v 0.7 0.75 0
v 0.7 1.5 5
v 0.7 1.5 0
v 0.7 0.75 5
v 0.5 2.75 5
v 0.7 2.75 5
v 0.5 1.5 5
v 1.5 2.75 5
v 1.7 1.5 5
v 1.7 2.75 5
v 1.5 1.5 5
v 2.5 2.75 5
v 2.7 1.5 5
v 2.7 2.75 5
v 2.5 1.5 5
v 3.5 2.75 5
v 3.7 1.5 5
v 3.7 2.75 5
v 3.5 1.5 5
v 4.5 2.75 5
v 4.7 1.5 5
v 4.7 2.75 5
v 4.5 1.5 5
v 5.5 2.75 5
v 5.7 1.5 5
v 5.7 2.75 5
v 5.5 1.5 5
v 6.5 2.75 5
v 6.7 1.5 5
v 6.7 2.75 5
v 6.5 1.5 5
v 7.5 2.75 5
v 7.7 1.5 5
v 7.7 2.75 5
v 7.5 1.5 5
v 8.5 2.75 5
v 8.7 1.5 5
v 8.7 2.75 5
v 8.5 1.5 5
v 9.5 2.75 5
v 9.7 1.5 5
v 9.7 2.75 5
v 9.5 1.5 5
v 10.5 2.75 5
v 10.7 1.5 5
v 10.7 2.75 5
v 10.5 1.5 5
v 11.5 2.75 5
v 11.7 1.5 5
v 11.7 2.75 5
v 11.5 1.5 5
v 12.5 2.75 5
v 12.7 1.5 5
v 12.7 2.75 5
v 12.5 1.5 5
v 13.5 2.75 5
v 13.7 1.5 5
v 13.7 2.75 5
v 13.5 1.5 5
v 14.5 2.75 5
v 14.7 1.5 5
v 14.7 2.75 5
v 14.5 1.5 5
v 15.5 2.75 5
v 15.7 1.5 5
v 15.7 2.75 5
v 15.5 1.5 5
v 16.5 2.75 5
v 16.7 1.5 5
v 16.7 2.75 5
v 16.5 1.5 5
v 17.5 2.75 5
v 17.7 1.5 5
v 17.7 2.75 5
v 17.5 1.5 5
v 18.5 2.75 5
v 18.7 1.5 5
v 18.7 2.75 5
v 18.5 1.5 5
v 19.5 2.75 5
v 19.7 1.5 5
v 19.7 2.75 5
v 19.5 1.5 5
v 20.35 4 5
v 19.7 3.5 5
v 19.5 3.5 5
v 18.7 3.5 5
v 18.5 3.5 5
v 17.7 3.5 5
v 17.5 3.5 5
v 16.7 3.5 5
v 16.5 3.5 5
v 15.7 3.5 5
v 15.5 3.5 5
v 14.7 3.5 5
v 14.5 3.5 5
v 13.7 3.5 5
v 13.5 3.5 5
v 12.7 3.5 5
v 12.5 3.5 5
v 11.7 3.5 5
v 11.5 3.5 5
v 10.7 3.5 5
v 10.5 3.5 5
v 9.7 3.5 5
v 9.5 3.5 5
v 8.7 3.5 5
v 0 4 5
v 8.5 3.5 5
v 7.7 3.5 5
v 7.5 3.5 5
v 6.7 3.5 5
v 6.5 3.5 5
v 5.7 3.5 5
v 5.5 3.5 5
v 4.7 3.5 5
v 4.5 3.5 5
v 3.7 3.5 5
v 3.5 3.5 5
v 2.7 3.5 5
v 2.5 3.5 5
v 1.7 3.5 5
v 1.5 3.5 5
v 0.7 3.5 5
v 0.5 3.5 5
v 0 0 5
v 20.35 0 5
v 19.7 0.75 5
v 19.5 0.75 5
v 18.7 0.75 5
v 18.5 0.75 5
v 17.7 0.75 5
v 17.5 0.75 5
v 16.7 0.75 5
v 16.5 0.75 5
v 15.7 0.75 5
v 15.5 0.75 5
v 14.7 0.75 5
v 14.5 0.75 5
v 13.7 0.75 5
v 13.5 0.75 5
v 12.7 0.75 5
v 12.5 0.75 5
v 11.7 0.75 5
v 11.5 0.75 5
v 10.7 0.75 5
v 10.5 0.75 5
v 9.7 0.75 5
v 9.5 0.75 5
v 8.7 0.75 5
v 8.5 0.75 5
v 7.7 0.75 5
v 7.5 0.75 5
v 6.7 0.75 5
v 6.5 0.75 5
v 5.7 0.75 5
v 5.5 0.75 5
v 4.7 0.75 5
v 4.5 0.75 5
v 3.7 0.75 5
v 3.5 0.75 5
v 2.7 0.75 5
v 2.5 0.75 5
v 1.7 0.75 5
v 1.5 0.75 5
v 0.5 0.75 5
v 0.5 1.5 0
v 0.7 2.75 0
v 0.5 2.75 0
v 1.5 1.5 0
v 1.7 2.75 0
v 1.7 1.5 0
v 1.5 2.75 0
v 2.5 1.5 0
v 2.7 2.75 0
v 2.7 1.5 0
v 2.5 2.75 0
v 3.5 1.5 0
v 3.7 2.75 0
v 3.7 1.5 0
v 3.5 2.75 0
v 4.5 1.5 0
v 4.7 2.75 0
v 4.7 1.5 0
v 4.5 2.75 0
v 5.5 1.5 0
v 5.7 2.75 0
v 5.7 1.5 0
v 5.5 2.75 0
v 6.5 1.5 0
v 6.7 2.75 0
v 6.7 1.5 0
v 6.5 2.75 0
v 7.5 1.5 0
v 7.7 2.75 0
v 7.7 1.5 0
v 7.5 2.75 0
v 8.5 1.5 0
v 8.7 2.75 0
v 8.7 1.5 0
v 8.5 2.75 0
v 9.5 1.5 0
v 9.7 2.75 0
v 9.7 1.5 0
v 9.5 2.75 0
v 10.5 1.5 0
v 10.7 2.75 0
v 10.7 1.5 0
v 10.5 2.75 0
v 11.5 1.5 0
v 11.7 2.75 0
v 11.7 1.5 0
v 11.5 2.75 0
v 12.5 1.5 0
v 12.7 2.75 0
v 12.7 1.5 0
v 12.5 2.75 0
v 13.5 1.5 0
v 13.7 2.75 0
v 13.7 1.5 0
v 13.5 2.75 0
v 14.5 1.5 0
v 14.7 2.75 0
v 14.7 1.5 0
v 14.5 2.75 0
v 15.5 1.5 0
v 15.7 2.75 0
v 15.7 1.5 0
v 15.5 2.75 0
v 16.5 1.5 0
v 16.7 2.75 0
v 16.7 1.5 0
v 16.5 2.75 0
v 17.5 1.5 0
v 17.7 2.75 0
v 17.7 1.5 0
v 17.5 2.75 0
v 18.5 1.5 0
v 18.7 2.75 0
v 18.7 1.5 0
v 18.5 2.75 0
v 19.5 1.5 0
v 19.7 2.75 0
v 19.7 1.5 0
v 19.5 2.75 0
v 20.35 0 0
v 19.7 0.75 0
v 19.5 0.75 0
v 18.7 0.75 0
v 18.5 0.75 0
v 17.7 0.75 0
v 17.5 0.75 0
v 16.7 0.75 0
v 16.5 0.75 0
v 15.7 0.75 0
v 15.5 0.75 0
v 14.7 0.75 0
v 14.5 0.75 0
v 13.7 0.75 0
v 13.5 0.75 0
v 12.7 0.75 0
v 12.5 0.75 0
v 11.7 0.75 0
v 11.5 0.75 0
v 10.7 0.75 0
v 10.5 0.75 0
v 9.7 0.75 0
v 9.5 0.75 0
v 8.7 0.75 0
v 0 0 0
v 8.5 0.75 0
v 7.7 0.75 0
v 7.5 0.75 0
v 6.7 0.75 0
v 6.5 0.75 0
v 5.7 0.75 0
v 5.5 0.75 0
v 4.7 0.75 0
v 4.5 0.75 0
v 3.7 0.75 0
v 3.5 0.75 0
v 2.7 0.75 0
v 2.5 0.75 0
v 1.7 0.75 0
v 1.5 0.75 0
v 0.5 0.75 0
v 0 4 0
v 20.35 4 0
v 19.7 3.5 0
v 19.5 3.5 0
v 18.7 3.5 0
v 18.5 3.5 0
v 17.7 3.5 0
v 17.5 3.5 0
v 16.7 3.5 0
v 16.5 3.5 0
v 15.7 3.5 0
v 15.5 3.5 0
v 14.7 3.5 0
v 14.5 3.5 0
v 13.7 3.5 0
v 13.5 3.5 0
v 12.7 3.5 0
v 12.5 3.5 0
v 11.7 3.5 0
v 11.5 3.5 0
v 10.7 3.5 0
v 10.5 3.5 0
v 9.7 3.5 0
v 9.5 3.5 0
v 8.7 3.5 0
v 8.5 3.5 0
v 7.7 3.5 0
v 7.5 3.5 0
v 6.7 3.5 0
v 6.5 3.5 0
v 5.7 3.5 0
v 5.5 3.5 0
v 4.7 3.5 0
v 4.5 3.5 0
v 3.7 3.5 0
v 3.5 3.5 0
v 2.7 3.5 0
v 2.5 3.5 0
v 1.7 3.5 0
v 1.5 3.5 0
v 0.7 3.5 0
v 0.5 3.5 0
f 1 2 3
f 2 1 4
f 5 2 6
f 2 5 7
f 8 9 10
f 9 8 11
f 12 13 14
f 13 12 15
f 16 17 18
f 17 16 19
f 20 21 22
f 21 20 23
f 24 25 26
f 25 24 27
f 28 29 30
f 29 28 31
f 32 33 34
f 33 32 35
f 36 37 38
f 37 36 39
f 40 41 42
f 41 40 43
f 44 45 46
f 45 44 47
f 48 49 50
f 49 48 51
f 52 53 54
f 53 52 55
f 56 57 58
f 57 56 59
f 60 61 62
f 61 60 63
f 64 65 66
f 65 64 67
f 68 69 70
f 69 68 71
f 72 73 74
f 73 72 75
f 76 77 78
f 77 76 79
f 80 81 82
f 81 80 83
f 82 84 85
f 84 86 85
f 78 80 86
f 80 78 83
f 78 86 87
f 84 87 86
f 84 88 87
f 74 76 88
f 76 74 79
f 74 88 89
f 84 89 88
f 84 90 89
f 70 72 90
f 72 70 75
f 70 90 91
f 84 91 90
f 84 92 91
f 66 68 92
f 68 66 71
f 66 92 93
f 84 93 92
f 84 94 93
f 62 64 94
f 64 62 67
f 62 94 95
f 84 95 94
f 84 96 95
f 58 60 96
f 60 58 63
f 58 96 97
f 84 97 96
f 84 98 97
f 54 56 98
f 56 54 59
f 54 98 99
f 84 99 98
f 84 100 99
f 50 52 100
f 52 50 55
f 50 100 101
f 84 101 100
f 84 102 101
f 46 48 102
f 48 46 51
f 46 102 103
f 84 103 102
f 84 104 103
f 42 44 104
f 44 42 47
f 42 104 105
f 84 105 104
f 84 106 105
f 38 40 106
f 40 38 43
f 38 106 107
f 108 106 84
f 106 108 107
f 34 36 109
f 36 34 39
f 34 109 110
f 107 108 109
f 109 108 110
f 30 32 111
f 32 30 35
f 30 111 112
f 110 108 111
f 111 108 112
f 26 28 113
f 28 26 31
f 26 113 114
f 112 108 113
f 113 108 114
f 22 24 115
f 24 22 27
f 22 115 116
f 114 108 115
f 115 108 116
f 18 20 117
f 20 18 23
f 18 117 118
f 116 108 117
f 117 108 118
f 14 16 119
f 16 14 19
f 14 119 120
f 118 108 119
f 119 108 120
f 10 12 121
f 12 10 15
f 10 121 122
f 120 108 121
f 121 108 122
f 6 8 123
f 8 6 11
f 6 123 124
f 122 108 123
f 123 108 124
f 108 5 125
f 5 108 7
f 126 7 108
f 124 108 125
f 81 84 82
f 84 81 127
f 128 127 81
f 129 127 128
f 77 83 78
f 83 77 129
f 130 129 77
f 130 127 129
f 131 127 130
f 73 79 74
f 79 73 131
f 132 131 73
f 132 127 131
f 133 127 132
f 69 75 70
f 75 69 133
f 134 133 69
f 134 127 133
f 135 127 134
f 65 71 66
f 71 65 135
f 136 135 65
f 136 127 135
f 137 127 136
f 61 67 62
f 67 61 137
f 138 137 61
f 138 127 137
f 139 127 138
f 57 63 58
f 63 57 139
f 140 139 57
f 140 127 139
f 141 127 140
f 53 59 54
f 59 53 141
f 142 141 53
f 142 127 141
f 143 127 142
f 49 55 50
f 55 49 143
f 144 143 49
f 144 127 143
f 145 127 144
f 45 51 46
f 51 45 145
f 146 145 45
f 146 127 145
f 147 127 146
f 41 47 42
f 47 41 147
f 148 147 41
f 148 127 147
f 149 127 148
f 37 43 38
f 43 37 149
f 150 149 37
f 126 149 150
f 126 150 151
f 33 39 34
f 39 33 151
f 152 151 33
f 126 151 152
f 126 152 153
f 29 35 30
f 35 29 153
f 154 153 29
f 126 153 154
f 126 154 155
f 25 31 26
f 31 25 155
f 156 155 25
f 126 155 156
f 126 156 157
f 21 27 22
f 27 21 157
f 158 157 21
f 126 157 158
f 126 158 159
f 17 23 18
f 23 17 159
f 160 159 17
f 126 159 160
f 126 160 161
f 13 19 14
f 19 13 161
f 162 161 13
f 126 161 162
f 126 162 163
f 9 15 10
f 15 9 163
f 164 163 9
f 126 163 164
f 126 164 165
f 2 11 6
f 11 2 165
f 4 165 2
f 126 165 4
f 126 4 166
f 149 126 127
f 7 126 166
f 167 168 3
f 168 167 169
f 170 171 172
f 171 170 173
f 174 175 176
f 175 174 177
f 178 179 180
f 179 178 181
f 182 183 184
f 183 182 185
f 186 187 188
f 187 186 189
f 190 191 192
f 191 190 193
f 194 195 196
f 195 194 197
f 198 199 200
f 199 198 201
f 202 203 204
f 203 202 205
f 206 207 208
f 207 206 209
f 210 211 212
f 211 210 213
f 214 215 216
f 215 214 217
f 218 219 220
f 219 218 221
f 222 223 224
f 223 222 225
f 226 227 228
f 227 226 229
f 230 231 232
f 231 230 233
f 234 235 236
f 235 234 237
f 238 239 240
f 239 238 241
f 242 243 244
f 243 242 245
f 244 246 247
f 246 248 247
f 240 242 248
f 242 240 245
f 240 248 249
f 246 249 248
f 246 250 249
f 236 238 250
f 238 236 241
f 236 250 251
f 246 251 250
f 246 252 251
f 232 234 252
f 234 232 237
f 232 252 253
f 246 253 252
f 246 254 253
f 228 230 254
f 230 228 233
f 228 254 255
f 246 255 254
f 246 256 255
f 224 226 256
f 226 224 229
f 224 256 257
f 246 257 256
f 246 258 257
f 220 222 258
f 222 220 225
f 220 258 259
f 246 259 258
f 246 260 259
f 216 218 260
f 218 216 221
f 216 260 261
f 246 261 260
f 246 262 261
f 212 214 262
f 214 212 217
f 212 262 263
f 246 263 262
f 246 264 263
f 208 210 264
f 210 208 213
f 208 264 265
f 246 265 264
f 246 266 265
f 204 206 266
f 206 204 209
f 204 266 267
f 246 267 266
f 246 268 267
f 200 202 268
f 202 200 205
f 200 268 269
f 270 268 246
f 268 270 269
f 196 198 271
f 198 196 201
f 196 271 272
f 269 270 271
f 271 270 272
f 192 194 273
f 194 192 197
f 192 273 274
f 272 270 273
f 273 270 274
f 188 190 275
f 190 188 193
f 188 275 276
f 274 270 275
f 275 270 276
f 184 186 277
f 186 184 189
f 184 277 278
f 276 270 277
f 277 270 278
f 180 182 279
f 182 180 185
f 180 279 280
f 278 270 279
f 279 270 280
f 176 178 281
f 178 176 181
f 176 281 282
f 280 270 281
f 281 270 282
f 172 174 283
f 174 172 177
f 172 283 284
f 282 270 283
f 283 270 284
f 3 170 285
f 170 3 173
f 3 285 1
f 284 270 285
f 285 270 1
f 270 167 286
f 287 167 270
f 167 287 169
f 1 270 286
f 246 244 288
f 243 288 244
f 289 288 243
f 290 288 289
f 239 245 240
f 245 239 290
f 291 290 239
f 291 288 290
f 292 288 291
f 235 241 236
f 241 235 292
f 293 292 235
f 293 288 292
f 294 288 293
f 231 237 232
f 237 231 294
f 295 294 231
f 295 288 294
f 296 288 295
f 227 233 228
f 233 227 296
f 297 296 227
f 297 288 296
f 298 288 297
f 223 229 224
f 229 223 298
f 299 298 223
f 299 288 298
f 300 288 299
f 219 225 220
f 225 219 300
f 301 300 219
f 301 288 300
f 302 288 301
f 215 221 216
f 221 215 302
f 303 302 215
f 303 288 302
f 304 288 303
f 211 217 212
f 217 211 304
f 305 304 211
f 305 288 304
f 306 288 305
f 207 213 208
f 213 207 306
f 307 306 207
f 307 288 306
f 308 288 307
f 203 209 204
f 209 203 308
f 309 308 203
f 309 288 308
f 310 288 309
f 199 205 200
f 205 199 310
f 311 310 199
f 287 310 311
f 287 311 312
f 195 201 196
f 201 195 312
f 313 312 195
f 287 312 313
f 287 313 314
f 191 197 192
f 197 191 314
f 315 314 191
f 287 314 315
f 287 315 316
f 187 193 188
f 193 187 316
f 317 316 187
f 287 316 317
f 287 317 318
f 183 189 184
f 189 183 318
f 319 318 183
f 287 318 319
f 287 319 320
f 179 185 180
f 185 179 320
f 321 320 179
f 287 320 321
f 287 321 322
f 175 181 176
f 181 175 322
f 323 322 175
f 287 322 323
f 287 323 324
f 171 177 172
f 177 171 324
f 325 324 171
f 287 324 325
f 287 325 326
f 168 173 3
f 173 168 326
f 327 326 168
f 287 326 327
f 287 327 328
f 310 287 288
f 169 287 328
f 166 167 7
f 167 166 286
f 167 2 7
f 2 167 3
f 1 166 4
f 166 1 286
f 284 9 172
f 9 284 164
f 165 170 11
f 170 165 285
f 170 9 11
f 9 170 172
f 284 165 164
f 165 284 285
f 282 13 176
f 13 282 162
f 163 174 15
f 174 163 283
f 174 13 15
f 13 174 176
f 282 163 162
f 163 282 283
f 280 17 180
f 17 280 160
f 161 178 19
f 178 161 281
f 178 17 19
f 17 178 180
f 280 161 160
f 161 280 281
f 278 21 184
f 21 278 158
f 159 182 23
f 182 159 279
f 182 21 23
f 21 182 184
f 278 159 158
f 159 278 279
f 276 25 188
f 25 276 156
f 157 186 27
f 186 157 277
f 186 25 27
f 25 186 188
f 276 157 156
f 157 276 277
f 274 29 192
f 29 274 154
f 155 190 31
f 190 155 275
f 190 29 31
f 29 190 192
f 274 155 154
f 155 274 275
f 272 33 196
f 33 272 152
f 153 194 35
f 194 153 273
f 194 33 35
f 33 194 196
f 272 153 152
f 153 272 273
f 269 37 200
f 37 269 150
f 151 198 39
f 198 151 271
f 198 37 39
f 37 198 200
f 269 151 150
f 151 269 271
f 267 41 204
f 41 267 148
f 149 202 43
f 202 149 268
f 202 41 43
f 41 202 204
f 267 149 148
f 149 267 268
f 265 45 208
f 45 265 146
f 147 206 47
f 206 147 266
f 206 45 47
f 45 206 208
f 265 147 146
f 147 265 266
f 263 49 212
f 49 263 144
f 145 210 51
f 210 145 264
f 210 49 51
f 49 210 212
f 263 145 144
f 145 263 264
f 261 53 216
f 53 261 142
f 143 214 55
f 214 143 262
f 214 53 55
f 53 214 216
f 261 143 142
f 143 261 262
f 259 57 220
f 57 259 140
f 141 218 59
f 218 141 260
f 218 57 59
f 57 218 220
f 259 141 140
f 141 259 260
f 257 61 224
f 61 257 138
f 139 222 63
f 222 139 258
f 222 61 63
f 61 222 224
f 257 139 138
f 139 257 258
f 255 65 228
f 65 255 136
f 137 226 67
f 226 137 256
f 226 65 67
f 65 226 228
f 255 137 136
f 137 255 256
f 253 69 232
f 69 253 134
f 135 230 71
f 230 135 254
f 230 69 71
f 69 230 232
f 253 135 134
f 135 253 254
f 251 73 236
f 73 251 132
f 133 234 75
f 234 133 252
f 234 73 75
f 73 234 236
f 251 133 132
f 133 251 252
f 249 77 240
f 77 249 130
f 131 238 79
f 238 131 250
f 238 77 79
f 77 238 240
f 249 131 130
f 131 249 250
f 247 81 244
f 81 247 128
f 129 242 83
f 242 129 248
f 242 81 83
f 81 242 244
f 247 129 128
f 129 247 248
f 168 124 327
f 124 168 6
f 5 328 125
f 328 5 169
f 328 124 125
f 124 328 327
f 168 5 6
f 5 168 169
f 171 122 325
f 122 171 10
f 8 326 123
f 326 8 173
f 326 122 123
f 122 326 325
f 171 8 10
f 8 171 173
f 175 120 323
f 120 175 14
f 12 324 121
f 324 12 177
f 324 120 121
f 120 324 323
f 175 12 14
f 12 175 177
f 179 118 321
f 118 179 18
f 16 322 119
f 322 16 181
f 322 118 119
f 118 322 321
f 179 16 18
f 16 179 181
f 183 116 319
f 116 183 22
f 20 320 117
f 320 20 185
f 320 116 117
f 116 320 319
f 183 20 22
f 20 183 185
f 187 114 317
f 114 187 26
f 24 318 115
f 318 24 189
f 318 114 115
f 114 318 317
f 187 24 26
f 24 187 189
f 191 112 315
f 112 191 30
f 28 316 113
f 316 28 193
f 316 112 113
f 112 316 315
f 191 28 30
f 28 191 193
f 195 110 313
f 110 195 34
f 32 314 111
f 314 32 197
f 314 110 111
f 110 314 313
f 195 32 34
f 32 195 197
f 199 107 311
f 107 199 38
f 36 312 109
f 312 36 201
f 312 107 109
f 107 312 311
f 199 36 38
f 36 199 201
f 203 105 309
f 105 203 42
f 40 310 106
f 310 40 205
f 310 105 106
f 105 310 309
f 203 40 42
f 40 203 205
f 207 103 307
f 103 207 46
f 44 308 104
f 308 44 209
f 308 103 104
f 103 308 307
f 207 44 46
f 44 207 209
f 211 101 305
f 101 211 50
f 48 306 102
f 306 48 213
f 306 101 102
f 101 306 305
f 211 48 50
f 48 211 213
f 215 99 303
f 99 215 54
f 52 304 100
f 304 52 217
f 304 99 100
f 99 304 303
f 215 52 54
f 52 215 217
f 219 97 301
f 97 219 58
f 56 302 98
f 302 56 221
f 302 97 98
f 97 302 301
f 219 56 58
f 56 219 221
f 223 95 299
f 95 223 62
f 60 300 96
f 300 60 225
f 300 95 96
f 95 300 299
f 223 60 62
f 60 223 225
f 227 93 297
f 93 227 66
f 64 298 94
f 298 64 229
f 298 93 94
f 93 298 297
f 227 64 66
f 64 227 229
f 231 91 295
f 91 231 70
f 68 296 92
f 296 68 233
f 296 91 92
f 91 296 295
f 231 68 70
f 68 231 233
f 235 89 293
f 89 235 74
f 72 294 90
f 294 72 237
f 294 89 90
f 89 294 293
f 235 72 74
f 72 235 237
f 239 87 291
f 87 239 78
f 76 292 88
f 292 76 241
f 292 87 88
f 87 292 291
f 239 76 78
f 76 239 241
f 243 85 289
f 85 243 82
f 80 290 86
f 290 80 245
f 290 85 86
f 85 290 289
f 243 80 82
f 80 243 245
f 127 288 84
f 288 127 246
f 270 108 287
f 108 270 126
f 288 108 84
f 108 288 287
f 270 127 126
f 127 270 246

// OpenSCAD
//Length, width, height
connector=[20.35, 4, 5];

//Rows, cols
pins = [2, 20];
pin_dimension=[0.2, 0.75, connector[2]];

spacing = [1, 2 , 0];



difference(){
    cube(connector);
    for(i = [0 : pins[0]]){
        for(j = [0 : pins[1]]){
            translate([spacing[0] * j+0.5, spacing[1] * i+0.75, spacing[2]])cube(pin_dimension);
        }
    }
}
